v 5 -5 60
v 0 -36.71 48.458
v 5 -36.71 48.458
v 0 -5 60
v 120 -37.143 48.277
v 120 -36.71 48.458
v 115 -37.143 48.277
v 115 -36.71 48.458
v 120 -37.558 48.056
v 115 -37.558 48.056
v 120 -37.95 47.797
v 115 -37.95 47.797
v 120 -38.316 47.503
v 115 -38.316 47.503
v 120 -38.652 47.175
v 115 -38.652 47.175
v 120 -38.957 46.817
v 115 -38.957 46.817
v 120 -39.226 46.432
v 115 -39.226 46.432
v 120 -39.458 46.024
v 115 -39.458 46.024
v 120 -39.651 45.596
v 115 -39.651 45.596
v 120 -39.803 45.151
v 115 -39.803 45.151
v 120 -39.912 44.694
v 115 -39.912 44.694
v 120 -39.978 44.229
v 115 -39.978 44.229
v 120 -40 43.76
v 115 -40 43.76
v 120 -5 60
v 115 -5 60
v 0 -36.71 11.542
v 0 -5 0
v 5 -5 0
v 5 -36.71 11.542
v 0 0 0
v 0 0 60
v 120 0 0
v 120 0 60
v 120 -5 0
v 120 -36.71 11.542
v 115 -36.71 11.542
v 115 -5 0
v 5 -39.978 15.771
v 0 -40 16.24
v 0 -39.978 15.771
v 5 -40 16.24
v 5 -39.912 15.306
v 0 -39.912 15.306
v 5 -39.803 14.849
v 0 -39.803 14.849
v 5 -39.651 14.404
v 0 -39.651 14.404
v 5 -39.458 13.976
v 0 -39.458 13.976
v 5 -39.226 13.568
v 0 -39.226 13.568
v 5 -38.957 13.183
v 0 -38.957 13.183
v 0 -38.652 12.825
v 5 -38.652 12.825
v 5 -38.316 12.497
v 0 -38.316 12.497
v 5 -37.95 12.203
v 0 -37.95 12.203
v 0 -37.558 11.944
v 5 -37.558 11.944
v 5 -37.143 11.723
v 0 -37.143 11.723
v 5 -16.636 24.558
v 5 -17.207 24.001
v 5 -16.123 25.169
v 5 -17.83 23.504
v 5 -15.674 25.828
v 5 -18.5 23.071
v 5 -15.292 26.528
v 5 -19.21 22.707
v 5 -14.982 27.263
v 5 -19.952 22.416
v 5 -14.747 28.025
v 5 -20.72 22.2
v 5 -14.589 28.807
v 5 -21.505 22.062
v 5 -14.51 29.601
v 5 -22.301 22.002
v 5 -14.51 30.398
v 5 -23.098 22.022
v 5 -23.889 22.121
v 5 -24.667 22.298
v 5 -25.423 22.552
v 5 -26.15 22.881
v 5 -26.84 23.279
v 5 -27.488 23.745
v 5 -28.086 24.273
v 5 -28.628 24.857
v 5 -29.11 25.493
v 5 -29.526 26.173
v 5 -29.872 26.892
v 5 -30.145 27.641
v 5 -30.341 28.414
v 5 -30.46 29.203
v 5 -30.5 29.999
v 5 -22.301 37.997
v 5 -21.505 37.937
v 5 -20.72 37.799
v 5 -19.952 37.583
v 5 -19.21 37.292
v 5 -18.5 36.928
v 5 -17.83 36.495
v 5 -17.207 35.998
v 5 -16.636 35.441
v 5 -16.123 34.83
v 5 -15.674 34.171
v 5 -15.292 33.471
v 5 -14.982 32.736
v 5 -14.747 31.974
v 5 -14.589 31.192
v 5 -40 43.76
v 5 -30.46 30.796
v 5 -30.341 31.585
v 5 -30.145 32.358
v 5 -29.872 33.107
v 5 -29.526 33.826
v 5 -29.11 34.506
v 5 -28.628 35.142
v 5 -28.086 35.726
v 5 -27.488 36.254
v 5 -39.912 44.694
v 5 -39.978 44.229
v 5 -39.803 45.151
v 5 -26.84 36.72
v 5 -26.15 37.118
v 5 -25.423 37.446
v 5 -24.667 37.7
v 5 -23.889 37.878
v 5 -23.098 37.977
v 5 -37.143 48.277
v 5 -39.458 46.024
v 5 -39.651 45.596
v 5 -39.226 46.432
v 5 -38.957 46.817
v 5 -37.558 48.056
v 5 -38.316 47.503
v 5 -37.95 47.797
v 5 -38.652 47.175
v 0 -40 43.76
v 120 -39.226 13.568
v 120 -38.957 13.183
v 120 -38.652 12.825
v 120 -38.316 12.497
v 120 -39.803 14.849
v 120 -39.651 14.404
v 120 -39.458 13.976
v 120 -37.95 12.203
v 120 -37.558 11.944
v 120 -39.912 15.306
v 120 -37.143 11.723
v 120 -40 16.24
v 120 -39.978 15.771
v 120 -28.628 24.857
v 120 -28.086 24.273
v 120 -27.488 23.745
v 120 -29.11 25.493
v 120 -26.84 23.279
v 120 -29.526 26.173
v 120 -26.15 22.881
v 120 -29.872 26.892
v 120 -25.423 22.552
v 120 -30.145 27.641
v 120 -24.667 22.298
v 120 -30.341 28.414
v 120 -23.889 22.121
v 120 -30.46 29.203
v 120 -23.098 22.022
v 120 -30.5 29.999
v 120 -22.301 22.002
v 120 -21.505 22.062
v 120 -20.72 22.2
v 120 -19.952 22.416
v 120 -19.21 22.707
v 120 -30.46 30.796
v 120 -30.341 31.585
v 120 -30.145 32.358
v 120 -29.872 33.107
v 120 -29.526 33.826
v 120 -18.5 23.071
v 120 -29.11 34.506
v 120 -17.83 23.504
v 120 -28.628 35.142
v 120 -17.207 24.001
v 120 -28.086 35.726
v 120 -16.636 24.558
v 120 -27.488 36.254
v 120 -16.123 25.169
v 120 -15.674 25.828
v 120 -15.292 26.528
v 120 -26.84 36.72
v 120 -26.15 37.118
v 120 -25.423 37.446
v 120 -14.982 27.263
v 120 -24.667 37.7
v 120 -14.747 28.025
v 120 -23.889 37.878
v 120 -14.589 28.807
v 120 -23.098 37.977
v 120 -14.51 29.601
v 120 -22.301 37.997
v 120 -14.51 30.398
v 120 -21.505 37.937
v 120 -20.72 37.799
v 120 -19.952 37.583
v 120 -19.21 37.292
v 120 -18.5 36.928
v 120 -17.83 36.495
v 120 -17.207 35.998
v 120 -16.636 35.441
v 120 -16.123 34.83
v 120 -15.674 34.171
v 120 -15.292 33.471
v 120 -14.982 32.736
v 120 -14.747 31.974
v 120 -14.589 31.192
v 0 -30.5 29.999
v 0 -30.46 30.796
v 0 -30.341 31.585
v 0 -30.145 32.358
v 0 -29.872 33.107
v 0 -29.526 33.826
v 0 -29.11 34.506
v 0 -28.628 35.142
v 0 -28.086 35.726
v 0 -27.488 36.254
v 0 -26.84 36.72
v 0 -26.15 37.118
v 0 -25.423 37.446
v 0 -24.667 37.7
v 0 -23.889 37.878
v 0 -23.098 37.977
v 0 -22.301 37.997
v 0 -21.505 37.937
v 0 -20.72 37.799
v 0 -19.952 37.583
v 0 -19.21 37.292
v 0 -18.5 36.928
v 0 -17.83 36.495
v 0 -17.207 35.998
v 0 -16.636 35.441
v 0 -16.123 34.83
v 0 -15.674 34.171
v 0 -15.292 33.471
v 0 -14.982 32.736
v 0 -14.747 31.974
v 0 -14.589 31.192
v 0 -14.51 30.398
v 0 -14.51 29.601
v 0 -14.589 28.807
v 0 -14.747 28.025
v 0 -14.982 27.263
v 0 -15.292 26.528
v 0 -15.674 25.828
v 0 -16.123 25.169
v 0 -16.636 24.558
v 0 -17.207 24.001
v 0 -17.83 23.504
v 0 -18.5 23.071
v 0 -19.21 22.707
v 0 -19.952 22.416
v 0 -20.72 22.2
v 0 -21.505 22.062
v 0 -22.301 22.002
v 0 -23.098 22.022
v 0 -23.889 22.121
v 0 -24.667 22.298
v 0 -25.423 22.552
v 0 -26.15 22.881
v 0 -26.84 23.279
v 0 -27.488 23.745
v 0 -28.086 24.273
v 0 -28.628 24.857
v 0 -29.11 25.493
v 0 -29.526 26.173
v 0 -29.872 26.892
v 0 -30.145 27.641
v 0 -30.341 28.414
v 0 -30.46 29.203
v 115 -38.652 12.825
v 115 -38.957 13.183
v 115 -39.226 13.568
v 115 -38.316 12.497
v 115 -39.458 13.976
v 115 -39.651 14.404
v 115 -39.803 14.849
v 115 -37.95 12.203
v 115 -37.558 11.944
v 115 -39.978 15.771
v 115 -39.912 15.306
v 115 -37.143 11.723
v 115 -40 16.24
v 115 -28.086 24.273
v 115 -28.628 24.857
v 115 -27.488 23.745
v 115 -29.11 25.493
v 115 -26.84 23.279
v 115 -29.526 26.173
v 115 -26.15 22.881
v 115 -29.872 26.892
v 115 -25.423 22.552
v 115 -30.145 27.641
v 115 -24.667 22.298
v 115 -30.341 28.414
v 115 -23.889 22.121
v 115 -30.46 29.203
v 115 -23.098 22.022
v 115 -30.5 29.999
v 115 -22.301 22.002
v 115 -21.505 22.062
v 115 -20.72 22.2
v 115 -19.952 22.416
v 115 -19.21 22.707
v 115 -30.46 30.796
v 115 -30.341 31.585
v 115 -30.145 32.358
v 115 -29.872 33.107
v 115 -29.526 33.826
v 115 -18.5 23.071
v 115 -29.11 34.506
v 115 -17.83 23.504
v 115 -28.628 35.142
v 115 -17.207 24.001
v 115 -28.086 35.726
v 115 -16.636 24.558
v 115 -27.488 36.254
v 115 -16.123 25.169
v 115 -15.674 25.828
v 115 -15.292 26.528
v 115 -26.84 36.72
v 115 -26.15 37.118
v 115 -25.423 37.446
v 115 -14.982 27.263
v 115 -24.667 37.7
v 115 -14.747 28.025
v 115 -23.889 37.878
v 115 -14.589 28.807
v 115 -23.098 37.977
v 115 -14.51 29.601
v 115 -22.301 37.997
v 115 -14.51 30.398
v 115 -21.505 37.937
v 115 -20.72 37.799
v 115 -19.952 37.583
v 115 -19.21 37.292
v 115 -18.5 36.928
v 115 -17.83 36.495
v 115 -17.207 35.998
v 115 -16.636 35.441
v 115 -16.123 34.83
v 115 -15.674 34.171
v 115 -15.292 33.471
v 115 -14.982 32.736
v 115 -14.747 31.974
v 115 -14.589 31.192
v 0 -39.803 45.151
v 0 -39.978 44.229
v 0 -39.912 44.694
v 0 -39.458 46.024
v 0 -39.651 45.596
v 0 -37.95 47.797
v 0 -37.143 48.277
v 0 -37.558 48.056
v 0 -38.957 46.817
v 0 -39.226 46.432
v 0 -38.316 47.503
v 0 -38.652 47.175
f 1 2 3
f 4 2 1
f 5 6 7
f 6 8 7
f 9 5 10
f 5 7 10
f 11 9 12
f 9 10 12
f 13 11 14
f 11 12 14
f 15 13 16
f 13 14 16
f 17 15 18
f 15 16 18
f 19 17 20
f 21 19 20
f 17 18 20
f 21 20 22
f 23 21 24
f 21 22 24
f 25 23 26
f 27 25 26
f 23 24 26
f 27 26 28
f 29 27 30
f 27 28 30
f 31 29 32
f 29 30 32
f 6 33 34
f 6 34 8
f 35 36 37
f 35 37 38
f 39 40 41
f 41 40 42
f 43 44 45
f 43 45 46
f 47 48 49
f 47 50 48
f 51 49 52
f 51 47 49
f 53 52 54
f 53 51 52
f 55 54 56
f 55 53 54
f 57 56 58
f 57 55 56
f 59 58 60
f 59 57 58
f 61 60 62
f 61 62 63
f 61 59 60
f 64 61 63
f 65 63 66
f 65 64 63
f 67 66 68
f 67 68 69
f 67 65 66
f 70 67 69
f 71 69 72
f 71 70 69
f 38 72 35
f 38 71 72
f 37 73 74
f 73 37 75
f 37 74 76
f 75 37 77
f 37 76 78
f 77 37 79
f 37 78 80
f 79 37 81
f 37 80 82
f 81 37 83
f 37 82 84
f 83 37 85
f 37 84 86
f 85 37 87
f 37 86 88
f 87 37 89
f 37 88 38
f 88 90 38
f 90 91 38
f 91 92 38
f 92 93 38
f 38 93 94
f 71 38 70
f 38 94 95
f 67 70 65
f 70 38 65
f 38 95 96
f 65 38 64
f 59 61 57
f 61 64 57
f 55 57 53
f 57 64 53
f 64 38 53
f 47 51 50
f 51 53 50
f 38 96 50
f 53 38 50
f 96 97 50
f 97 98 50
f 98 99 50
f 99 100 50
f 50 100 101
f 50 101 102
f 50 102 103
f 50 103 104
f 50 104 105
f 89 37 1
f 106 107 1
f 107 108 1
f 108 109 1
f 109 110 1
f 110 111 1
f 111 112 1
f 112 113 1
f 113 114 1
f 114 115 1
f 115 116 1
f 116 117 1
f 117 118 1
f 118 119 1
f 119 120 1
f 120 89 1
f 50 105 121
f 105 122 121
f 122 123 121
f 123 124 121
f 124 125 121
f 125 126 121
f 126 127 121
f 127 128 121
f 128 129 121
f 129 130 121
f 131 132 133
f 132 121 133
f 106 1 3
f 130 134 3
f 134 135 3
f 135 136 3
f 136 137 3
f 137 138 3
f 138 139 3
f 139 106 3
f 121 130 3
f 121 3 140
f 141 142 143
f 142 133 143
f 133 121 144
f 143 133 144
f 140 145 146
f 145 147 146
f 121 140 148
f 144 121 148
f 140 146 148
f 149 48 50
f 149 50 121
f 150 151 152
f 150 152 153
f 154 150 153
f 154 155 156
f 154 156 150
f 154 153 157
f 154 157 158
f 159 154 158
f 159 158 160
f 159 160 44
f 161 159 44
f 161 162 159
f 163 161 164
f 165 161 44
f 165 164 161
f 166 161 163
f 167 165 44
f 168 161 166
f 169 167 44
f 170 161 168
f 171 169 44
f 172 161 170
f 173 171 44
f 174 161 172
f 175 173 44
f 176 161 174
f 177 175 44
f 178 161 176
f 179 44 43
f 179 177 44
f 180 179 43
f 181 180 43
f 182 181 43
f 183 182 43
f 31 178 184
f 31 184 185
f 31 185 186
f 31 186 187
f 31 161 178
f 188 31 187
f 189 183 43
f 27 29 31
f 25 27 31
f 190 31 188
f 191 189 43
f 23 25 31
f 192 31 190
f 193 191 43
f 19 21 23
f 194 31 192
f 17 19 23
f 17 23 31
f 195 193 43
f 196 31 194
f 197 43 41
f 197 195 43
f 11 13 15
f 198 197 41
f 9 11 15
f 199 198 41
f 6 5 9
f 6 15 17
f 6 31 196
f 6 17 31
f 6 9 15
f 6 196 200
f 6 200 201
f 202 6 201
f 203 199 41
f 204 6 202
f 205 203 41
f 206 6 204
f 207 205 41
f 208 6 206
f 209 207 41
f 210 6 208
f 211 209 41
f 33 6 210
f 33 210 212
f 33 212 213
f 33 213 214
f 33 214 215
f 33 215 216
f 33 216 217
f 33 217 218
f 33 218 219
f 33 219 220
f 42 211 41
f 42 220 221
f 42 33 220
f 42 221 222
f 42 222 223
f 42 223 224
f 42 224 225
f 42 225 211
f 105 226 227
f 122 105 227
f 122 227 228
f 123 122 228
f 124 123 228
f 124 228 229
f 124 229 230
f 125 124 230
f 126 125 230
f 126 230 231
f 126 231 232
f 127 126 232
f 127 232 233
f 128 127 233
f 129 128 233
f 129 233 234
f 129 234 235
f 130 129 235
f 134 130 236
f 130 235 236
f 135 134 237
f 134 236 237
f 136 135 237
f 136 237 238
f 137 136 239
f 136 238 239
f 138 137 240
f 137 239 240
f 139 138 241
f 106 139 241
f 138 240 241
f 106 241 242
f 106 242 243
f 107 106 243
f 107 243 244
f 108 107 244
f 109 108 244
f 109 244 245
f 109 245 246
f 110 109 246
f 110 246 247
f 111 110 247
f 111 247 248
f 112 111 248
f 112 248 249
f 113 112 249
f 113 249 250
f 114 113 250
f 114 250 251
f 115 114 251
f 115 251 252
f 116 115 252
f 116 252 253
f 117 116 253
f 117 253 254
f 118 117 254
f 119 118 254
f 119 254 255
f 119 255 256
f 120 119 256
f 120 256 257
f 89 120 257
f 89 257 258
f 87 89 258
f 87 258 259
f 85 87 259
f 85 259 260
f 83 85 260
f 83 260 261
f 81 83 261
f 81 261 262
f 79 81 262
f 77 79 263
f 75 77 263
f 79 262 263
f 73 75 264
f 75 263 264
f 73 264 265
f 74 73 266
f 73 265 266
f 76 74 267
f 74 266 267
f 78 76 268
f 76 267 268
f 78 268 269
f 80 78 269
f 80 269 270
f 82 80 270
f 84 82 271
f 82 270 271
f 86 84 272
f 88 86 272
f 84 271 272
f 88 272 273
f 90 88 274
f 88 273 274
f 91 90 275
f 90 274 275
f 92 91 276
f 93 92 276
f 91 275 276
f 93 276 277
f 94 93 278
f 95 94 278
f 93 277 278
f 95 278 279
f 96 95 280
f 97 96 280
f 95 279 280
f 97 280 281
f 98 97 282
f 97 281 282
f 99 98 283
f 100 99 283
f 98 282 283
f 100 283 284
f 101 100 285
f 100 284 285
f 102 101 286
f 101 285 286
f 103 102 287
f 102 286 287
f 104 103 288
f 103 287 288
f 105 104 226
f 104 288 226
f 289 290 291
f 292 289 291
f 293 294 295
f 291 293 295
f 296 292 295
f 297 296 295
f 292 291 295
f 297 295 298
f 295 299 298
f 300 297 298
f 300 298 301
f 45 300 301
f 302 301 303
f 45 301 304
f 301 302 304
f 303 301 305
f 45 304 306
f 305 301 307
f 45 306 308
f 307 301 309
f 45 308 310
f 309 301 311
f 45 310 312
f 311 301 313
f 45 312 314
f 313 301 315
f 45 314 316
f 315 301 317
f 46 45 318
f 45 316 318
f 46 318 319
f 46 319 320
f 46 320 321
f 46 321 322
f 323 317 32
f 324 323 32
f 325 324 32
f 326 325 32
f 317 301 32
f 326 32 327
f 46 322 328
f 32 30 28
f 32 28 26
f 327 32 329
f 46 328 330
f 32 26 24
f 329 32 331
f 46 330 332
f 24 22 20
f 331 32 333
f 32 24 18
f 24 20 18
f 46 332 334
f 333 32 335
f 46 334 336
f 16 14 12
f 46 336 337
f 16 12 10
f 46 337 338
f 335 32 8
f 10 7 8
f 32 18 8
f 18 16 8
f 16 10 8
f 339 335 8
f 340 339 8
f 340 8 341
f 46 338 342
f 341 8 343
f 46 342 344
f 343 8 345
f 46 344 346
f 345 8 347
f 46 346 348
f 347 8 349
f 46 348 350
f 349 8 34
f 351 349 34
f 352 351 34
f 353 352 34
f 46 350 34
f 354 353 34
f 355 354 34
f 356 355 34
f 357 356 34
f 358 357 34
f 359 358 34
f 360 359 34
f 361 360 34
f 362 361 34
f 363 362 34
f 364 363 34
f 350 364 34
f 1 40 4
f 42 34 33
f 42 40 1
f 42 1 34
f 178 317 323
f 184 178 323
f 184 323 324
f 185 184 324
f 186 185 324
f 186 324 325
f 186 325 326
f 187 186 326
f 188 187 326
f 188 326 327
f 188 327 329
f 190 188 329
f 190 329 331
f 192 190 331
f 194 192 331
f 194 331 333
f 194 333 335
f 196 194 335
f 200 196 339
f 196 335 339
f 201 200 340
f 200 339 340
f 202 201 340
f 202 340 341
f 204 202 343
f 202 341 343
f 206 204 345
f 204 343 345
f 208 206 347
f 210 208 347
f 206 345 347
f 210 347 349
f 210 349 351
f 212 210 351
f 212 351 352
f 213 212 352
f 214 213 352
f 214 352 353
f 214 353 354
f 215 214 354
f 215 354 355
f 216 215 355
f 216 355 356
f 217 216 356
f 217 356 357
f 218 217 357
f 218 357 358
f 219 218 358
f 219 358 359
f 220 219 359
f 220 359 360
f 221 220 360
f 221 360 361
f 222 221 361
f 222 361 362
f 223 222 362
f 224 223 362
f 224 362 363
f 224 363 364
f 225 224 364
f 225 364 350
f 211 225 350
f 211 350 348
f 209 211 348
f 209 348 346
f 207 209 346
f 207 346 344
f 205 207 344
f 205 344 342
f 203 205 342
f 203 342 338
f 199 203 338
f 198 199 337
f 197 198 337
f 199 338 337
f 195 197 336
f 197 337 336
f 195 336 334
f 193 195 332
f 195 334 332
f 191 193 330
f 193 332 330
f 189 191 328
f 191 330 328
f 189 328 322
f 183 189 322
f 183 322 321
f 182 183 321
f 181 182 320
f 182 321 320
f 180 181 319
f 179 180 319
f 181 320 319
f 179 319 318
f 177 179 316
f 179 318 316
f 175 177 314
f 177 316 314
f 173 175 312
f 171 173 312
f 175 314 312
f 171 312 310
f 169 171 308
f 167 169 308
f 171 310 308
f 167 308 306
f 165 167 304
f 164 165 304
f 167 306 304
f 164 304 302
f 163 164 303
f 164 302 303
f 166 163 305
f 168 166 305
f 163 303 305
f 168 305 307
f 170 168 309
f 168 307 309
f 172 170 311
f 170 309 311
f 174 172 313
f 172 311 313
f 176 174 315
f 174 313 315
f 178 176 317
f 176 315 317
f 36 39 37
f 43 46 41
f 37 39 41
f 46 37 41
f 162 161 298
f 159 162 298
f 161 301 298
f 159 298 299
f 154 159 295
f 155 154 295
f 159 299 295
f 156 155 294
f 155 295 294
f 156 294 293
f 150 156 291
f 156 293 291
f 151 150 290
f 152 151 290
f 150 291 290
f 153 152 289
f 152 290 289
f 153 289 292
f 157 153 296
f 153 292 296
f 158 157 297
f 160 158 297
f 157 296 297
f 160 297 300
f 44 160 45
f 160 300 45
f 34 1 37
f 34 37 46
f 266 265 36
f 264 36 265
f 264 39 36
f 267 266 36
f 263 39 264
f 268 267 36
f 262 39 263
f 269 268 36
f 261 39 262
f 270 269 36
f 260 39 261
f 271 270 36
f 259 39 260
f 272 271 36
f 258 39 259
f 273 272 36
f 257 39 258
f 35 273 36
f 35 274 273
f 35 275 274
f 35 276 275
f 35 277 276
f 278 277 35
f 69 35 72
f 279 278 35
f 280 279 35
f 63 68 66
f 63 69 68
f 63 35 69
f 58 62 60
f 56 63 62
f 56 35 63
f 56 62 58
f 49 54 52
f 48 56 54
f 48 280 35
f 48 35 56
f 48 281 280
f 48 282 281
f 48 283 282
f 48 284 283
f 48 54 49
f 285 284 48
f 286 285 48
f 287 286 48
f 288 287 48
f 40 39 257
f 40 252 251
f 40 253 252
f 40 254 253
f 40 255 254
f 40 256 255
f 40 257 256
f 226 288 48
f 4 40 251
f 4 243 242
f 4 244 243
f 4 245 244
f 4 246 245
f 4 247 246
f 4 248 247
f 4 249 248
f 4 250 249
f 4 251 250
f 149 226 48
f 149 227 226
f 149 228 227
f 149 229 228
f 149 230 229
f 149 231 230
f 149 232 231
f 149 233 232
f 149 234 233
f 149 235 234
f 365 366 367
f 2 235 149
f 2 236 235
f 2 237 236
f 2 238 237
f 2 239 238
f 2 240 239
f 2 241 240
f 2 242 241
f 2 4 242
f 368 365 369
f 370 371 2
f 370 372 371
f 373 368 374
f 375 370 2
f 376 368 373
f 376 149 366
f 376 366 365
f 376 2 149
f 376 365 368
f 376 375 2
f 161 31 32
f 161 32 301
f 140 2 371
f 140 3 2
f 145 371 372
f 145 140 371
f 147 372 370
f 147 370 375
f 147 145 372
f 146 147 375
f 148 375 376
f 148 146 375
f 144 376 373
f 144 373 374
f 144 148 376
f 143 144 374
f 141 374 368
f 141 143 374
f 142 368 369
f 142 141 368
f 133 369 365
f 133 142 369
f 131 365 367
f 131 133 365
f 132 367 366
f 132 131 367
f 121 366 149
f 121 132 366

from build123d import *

# Parameters (mm, degrees)
F0_W     = 120
F0_H     = 60
F1_DEPTH = 5
F3_DEPTH = 5
F6_DEPTH = 5
F4_R     = 8
F7_DEPTH = 146
F8_R     = 5


with BuildPart() as f1:
    # F0 (on Front) → F1 (new body)
    with BuildSketch(Plane.XZ):
        with Locations((60, 30)):
            Rectangle(F0_W, F0_H)
    extrude(amount=F1_DEPTH)

    # F2 (on face) → F3 (join)
    with BuildSketch(Plane(origin=(0, 0, 0), x_dir=(0, -1, 0), z_dir=(-1, 0, 0))):
        Polygon((40, 47.261042), (5, 60), (5, 0), (40, 12.738958), align=None)
    extrude(amount=-F3_DEPTH)

    # F5 (on face) → F6 (join)
    with BuildSketch(Plane.YZ.offset(120)):
        Polygon((-5, 0), (-5, 60), (-40, 47.261042), (-40, 12.738958), align=None)
    extrude(amount=-F6_DEPTH)

    # F4 (on face) → F7 (cut)
    with BuildSketch(Plane(origin=(0, 0, 0), x_dir=(0, -1, 0), z_dir=(-1, 0, 0))):
        with Locations((22.5, 29.999479)):
            Circle(F4_R)
    extrude(amount=-F7_DEPTH, mode=Mode.SUBTRACT)

    # F8
    f8_edges = [f1.edges().sort_by_distance(p)[0] for p in [
        (2.5, -40, 47.261042),
        (2.5, -40, 12.738958),
        (117.5, -40, 47.261042),
        (117.5, -40, 12.738958),
    ]]
    fillet(f8_edges, radius=F8_R)


solid = f1.part
